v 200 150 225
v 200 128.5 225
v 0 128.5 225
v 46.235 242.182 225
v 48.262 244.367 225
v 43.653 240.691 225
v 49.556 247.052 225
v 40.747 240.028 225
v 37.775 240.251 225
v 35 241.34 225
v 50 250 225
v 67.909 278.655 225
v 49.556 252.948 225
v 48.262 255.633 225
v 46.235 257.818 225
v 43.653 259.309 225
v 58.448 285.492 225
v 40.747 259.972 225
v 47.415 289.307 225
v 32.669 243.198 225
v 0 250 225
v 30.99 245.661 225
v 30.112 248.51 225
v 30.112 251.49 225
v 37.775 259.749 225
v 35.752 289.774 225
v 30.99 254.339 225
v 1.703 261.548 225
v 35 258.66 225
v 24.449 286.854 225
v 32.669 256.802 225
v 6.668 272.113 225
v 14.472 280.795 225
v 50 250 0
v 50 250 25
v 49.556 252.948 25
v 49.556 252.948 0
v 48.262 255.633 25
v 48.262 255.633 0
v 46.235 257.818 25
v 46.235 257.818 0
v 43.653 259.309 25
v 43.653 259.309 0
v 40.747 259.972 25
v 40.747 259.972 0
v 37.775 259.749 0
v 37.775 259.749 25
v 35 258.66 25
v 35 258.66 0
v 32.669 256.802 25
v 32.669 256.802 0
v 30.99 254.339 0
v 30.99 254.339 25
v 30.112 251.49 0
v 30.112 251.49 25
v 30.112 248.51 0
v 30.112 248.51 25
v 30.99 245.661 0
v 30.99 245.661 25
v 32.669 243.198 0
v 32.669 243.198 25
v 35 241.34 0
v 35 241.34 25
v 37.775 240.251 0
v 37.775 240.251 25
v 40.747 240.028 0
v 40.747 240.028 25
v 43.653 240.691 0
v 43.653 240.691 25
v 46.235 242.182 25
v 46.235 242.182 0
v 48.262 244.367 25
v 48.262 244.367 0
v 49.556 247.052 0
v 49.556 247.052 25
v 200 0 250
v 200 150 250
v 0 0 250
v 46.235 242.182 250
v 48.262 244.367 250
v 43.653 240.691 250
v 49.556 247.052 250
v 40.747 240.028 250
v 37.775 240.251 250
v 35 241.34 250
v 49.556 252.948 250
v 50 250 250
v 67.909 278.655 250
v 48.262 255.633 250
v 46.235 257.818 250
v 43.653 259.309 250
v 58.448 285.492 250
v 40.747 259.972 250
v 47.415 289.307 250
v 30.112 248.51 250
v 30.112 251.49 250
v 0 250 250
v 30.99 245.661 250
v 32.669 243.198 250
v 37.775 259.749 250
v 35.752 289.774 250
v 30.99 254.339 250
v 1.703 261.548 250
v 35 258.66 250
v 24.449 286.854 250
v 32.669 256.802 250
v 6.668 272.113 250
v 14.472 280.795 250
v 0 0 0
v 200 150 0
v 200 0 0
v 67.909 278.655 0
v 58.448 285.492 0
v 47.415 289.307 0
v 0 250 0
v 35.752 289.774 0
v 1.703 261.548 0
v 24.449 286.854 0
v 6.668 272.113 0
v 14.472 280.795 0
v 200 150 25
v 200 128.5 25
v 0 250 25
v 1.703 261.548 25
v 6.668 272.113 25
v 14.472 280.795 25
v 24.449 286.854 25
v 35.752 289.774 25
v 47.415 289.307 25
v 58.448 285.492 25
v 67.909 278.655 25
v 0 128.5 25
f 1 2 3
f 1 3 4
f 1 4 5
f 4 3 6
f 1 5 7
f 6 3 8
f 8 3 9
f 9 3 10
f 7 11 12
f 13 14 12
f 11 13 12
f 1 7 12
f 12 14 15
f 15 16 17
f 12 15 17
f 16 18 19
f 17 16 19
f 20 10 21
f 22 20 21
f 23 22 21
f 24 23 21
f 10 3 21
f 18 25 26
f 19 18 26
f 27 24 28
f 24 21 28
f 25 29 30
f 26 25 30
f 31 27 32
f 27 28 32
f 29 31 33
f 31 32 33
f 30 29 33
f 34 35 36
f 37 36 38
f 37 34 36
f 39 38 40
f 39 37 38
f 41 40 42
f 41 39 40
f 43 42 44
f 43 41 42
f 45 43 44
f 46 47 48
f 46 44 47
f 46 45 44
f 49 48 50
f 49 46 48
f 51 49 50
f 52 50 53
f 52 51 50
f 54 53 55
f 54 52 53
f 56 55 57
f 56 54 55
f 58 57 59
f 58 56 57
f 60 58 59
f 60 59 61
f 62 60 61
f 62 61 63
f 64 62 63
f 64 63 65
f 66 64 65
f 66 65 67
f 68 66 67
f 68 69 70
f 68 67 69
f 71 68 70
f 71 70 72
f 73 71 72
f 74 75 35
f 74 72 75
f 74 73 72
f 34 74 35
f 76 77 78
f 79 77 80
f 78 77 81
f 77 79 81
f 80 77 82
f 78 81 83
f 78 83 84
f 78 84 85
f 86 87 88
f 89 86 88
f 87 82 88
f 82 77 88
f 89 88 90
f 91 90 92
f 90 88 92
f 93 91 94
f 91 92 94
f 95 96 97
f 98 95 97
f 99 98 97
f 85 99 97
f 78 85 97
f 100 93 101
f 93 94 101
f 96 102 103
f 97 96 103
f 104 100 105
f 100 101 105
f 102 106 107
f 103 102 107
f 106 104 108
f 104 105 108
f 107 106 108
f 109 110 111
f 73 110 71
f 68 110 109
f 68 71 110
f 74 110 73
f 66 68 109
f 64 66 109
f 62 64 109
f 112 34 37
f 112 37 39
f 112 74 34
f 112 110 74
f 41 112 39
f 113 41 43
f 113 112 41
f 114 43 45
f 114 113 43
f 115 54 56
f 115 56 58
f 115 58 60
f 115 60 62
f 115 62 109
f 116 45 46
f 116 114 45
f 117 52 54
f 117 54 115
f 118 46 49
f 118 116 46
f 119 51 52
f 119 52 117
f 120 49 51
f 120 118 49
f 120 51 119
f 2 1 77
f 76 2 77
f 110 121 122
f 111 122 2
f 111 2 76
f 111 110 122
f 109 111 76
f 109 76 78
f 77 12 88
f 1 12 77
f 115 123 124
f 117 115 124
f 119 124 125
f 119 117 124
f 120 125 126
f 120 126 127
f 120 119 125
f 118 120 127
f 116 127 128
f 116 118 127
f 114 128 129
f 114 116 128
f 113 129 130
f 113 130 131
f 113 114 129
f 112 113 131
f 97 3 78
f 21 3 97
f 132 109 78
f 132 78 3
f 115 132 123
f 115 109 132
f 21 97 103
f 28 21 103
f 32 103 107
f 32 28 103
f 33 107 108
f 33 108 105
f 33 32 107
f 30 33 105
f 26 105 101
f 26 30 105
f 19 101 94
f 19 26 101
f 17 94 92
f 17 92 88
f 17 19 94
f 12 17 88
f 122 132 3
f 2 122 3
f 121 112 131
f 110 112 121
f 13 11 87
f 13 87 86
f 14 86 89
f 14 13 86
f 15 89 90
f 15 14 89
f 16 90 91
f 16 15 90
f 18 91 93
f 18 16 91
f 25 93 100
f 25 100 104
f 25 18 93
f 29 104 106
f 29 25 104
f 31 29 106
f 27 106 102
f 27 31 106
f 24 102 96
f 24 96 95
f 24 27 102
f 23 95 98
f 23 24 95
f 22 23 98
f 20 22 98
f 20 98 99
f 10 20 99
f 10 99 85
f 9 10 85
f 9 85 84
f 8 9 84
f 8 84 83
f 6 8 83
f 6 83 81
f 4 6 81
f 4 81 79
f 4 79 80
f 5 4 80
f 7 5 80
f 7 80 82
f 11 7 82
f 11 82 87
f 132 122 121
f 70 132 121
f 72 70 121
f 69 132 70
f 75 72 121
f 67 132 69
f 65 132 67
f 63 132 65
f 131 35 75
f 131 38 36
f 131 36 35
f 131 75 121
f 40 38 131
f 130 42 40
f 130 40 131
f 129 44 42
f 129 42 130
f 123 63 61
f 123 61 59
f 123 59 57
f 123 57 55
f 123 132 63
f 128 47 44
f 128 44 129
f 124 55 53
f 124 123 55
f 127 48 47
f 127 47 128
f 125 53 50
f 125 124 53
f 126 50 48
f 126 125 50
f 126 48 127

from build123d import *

# Parameters (mm, degrees)
CROQUIS1_R              = 10
SALIENTE_EXTRUIR1_DEPTH = 250
CROQUIS3_W              = 200
CROQUIS3_H              = 161.5
CORTAR_EXTRUIR1_DEPTH   = 250


with BuildPart() as part:
    # Croquis1 → Saliente-Extruir1 (new body)
    with BuildSketch(Plane.XY):
        with BuildLine():
            Line((0, 150), (0, 250))
            ThreePointArc((0, 250), (24.449494329, 286.853517788), (67.909088668, 278.654541869))
            Line((67.909088668, 278.654541869), (200, 150))
            Line((200, 150), (200, 0))
            Line((200, 0), (0, 0))
            Line((0, 0), (0, 150))
        make_face()
        with Locations((40, 250)):
            Circle(CROQUIS1_R, mode=Mode.SUBTRACT)
    extrude(amount=SALIENTE_EXTRUIR1_DEPTH)

    # Croquis3 → Cortar-Extruir1 (cut)
    with BuildSketch(Plane.ZY):
        with Locations((125, 209.25)):
            Rectangle(CROQUIS3_W, CROQUIS3_H)
    extrude(amount=-CORTAR_EXTRUIR1_DEPTH, mode=Mode.SUBTRACT)


solid = part.part
